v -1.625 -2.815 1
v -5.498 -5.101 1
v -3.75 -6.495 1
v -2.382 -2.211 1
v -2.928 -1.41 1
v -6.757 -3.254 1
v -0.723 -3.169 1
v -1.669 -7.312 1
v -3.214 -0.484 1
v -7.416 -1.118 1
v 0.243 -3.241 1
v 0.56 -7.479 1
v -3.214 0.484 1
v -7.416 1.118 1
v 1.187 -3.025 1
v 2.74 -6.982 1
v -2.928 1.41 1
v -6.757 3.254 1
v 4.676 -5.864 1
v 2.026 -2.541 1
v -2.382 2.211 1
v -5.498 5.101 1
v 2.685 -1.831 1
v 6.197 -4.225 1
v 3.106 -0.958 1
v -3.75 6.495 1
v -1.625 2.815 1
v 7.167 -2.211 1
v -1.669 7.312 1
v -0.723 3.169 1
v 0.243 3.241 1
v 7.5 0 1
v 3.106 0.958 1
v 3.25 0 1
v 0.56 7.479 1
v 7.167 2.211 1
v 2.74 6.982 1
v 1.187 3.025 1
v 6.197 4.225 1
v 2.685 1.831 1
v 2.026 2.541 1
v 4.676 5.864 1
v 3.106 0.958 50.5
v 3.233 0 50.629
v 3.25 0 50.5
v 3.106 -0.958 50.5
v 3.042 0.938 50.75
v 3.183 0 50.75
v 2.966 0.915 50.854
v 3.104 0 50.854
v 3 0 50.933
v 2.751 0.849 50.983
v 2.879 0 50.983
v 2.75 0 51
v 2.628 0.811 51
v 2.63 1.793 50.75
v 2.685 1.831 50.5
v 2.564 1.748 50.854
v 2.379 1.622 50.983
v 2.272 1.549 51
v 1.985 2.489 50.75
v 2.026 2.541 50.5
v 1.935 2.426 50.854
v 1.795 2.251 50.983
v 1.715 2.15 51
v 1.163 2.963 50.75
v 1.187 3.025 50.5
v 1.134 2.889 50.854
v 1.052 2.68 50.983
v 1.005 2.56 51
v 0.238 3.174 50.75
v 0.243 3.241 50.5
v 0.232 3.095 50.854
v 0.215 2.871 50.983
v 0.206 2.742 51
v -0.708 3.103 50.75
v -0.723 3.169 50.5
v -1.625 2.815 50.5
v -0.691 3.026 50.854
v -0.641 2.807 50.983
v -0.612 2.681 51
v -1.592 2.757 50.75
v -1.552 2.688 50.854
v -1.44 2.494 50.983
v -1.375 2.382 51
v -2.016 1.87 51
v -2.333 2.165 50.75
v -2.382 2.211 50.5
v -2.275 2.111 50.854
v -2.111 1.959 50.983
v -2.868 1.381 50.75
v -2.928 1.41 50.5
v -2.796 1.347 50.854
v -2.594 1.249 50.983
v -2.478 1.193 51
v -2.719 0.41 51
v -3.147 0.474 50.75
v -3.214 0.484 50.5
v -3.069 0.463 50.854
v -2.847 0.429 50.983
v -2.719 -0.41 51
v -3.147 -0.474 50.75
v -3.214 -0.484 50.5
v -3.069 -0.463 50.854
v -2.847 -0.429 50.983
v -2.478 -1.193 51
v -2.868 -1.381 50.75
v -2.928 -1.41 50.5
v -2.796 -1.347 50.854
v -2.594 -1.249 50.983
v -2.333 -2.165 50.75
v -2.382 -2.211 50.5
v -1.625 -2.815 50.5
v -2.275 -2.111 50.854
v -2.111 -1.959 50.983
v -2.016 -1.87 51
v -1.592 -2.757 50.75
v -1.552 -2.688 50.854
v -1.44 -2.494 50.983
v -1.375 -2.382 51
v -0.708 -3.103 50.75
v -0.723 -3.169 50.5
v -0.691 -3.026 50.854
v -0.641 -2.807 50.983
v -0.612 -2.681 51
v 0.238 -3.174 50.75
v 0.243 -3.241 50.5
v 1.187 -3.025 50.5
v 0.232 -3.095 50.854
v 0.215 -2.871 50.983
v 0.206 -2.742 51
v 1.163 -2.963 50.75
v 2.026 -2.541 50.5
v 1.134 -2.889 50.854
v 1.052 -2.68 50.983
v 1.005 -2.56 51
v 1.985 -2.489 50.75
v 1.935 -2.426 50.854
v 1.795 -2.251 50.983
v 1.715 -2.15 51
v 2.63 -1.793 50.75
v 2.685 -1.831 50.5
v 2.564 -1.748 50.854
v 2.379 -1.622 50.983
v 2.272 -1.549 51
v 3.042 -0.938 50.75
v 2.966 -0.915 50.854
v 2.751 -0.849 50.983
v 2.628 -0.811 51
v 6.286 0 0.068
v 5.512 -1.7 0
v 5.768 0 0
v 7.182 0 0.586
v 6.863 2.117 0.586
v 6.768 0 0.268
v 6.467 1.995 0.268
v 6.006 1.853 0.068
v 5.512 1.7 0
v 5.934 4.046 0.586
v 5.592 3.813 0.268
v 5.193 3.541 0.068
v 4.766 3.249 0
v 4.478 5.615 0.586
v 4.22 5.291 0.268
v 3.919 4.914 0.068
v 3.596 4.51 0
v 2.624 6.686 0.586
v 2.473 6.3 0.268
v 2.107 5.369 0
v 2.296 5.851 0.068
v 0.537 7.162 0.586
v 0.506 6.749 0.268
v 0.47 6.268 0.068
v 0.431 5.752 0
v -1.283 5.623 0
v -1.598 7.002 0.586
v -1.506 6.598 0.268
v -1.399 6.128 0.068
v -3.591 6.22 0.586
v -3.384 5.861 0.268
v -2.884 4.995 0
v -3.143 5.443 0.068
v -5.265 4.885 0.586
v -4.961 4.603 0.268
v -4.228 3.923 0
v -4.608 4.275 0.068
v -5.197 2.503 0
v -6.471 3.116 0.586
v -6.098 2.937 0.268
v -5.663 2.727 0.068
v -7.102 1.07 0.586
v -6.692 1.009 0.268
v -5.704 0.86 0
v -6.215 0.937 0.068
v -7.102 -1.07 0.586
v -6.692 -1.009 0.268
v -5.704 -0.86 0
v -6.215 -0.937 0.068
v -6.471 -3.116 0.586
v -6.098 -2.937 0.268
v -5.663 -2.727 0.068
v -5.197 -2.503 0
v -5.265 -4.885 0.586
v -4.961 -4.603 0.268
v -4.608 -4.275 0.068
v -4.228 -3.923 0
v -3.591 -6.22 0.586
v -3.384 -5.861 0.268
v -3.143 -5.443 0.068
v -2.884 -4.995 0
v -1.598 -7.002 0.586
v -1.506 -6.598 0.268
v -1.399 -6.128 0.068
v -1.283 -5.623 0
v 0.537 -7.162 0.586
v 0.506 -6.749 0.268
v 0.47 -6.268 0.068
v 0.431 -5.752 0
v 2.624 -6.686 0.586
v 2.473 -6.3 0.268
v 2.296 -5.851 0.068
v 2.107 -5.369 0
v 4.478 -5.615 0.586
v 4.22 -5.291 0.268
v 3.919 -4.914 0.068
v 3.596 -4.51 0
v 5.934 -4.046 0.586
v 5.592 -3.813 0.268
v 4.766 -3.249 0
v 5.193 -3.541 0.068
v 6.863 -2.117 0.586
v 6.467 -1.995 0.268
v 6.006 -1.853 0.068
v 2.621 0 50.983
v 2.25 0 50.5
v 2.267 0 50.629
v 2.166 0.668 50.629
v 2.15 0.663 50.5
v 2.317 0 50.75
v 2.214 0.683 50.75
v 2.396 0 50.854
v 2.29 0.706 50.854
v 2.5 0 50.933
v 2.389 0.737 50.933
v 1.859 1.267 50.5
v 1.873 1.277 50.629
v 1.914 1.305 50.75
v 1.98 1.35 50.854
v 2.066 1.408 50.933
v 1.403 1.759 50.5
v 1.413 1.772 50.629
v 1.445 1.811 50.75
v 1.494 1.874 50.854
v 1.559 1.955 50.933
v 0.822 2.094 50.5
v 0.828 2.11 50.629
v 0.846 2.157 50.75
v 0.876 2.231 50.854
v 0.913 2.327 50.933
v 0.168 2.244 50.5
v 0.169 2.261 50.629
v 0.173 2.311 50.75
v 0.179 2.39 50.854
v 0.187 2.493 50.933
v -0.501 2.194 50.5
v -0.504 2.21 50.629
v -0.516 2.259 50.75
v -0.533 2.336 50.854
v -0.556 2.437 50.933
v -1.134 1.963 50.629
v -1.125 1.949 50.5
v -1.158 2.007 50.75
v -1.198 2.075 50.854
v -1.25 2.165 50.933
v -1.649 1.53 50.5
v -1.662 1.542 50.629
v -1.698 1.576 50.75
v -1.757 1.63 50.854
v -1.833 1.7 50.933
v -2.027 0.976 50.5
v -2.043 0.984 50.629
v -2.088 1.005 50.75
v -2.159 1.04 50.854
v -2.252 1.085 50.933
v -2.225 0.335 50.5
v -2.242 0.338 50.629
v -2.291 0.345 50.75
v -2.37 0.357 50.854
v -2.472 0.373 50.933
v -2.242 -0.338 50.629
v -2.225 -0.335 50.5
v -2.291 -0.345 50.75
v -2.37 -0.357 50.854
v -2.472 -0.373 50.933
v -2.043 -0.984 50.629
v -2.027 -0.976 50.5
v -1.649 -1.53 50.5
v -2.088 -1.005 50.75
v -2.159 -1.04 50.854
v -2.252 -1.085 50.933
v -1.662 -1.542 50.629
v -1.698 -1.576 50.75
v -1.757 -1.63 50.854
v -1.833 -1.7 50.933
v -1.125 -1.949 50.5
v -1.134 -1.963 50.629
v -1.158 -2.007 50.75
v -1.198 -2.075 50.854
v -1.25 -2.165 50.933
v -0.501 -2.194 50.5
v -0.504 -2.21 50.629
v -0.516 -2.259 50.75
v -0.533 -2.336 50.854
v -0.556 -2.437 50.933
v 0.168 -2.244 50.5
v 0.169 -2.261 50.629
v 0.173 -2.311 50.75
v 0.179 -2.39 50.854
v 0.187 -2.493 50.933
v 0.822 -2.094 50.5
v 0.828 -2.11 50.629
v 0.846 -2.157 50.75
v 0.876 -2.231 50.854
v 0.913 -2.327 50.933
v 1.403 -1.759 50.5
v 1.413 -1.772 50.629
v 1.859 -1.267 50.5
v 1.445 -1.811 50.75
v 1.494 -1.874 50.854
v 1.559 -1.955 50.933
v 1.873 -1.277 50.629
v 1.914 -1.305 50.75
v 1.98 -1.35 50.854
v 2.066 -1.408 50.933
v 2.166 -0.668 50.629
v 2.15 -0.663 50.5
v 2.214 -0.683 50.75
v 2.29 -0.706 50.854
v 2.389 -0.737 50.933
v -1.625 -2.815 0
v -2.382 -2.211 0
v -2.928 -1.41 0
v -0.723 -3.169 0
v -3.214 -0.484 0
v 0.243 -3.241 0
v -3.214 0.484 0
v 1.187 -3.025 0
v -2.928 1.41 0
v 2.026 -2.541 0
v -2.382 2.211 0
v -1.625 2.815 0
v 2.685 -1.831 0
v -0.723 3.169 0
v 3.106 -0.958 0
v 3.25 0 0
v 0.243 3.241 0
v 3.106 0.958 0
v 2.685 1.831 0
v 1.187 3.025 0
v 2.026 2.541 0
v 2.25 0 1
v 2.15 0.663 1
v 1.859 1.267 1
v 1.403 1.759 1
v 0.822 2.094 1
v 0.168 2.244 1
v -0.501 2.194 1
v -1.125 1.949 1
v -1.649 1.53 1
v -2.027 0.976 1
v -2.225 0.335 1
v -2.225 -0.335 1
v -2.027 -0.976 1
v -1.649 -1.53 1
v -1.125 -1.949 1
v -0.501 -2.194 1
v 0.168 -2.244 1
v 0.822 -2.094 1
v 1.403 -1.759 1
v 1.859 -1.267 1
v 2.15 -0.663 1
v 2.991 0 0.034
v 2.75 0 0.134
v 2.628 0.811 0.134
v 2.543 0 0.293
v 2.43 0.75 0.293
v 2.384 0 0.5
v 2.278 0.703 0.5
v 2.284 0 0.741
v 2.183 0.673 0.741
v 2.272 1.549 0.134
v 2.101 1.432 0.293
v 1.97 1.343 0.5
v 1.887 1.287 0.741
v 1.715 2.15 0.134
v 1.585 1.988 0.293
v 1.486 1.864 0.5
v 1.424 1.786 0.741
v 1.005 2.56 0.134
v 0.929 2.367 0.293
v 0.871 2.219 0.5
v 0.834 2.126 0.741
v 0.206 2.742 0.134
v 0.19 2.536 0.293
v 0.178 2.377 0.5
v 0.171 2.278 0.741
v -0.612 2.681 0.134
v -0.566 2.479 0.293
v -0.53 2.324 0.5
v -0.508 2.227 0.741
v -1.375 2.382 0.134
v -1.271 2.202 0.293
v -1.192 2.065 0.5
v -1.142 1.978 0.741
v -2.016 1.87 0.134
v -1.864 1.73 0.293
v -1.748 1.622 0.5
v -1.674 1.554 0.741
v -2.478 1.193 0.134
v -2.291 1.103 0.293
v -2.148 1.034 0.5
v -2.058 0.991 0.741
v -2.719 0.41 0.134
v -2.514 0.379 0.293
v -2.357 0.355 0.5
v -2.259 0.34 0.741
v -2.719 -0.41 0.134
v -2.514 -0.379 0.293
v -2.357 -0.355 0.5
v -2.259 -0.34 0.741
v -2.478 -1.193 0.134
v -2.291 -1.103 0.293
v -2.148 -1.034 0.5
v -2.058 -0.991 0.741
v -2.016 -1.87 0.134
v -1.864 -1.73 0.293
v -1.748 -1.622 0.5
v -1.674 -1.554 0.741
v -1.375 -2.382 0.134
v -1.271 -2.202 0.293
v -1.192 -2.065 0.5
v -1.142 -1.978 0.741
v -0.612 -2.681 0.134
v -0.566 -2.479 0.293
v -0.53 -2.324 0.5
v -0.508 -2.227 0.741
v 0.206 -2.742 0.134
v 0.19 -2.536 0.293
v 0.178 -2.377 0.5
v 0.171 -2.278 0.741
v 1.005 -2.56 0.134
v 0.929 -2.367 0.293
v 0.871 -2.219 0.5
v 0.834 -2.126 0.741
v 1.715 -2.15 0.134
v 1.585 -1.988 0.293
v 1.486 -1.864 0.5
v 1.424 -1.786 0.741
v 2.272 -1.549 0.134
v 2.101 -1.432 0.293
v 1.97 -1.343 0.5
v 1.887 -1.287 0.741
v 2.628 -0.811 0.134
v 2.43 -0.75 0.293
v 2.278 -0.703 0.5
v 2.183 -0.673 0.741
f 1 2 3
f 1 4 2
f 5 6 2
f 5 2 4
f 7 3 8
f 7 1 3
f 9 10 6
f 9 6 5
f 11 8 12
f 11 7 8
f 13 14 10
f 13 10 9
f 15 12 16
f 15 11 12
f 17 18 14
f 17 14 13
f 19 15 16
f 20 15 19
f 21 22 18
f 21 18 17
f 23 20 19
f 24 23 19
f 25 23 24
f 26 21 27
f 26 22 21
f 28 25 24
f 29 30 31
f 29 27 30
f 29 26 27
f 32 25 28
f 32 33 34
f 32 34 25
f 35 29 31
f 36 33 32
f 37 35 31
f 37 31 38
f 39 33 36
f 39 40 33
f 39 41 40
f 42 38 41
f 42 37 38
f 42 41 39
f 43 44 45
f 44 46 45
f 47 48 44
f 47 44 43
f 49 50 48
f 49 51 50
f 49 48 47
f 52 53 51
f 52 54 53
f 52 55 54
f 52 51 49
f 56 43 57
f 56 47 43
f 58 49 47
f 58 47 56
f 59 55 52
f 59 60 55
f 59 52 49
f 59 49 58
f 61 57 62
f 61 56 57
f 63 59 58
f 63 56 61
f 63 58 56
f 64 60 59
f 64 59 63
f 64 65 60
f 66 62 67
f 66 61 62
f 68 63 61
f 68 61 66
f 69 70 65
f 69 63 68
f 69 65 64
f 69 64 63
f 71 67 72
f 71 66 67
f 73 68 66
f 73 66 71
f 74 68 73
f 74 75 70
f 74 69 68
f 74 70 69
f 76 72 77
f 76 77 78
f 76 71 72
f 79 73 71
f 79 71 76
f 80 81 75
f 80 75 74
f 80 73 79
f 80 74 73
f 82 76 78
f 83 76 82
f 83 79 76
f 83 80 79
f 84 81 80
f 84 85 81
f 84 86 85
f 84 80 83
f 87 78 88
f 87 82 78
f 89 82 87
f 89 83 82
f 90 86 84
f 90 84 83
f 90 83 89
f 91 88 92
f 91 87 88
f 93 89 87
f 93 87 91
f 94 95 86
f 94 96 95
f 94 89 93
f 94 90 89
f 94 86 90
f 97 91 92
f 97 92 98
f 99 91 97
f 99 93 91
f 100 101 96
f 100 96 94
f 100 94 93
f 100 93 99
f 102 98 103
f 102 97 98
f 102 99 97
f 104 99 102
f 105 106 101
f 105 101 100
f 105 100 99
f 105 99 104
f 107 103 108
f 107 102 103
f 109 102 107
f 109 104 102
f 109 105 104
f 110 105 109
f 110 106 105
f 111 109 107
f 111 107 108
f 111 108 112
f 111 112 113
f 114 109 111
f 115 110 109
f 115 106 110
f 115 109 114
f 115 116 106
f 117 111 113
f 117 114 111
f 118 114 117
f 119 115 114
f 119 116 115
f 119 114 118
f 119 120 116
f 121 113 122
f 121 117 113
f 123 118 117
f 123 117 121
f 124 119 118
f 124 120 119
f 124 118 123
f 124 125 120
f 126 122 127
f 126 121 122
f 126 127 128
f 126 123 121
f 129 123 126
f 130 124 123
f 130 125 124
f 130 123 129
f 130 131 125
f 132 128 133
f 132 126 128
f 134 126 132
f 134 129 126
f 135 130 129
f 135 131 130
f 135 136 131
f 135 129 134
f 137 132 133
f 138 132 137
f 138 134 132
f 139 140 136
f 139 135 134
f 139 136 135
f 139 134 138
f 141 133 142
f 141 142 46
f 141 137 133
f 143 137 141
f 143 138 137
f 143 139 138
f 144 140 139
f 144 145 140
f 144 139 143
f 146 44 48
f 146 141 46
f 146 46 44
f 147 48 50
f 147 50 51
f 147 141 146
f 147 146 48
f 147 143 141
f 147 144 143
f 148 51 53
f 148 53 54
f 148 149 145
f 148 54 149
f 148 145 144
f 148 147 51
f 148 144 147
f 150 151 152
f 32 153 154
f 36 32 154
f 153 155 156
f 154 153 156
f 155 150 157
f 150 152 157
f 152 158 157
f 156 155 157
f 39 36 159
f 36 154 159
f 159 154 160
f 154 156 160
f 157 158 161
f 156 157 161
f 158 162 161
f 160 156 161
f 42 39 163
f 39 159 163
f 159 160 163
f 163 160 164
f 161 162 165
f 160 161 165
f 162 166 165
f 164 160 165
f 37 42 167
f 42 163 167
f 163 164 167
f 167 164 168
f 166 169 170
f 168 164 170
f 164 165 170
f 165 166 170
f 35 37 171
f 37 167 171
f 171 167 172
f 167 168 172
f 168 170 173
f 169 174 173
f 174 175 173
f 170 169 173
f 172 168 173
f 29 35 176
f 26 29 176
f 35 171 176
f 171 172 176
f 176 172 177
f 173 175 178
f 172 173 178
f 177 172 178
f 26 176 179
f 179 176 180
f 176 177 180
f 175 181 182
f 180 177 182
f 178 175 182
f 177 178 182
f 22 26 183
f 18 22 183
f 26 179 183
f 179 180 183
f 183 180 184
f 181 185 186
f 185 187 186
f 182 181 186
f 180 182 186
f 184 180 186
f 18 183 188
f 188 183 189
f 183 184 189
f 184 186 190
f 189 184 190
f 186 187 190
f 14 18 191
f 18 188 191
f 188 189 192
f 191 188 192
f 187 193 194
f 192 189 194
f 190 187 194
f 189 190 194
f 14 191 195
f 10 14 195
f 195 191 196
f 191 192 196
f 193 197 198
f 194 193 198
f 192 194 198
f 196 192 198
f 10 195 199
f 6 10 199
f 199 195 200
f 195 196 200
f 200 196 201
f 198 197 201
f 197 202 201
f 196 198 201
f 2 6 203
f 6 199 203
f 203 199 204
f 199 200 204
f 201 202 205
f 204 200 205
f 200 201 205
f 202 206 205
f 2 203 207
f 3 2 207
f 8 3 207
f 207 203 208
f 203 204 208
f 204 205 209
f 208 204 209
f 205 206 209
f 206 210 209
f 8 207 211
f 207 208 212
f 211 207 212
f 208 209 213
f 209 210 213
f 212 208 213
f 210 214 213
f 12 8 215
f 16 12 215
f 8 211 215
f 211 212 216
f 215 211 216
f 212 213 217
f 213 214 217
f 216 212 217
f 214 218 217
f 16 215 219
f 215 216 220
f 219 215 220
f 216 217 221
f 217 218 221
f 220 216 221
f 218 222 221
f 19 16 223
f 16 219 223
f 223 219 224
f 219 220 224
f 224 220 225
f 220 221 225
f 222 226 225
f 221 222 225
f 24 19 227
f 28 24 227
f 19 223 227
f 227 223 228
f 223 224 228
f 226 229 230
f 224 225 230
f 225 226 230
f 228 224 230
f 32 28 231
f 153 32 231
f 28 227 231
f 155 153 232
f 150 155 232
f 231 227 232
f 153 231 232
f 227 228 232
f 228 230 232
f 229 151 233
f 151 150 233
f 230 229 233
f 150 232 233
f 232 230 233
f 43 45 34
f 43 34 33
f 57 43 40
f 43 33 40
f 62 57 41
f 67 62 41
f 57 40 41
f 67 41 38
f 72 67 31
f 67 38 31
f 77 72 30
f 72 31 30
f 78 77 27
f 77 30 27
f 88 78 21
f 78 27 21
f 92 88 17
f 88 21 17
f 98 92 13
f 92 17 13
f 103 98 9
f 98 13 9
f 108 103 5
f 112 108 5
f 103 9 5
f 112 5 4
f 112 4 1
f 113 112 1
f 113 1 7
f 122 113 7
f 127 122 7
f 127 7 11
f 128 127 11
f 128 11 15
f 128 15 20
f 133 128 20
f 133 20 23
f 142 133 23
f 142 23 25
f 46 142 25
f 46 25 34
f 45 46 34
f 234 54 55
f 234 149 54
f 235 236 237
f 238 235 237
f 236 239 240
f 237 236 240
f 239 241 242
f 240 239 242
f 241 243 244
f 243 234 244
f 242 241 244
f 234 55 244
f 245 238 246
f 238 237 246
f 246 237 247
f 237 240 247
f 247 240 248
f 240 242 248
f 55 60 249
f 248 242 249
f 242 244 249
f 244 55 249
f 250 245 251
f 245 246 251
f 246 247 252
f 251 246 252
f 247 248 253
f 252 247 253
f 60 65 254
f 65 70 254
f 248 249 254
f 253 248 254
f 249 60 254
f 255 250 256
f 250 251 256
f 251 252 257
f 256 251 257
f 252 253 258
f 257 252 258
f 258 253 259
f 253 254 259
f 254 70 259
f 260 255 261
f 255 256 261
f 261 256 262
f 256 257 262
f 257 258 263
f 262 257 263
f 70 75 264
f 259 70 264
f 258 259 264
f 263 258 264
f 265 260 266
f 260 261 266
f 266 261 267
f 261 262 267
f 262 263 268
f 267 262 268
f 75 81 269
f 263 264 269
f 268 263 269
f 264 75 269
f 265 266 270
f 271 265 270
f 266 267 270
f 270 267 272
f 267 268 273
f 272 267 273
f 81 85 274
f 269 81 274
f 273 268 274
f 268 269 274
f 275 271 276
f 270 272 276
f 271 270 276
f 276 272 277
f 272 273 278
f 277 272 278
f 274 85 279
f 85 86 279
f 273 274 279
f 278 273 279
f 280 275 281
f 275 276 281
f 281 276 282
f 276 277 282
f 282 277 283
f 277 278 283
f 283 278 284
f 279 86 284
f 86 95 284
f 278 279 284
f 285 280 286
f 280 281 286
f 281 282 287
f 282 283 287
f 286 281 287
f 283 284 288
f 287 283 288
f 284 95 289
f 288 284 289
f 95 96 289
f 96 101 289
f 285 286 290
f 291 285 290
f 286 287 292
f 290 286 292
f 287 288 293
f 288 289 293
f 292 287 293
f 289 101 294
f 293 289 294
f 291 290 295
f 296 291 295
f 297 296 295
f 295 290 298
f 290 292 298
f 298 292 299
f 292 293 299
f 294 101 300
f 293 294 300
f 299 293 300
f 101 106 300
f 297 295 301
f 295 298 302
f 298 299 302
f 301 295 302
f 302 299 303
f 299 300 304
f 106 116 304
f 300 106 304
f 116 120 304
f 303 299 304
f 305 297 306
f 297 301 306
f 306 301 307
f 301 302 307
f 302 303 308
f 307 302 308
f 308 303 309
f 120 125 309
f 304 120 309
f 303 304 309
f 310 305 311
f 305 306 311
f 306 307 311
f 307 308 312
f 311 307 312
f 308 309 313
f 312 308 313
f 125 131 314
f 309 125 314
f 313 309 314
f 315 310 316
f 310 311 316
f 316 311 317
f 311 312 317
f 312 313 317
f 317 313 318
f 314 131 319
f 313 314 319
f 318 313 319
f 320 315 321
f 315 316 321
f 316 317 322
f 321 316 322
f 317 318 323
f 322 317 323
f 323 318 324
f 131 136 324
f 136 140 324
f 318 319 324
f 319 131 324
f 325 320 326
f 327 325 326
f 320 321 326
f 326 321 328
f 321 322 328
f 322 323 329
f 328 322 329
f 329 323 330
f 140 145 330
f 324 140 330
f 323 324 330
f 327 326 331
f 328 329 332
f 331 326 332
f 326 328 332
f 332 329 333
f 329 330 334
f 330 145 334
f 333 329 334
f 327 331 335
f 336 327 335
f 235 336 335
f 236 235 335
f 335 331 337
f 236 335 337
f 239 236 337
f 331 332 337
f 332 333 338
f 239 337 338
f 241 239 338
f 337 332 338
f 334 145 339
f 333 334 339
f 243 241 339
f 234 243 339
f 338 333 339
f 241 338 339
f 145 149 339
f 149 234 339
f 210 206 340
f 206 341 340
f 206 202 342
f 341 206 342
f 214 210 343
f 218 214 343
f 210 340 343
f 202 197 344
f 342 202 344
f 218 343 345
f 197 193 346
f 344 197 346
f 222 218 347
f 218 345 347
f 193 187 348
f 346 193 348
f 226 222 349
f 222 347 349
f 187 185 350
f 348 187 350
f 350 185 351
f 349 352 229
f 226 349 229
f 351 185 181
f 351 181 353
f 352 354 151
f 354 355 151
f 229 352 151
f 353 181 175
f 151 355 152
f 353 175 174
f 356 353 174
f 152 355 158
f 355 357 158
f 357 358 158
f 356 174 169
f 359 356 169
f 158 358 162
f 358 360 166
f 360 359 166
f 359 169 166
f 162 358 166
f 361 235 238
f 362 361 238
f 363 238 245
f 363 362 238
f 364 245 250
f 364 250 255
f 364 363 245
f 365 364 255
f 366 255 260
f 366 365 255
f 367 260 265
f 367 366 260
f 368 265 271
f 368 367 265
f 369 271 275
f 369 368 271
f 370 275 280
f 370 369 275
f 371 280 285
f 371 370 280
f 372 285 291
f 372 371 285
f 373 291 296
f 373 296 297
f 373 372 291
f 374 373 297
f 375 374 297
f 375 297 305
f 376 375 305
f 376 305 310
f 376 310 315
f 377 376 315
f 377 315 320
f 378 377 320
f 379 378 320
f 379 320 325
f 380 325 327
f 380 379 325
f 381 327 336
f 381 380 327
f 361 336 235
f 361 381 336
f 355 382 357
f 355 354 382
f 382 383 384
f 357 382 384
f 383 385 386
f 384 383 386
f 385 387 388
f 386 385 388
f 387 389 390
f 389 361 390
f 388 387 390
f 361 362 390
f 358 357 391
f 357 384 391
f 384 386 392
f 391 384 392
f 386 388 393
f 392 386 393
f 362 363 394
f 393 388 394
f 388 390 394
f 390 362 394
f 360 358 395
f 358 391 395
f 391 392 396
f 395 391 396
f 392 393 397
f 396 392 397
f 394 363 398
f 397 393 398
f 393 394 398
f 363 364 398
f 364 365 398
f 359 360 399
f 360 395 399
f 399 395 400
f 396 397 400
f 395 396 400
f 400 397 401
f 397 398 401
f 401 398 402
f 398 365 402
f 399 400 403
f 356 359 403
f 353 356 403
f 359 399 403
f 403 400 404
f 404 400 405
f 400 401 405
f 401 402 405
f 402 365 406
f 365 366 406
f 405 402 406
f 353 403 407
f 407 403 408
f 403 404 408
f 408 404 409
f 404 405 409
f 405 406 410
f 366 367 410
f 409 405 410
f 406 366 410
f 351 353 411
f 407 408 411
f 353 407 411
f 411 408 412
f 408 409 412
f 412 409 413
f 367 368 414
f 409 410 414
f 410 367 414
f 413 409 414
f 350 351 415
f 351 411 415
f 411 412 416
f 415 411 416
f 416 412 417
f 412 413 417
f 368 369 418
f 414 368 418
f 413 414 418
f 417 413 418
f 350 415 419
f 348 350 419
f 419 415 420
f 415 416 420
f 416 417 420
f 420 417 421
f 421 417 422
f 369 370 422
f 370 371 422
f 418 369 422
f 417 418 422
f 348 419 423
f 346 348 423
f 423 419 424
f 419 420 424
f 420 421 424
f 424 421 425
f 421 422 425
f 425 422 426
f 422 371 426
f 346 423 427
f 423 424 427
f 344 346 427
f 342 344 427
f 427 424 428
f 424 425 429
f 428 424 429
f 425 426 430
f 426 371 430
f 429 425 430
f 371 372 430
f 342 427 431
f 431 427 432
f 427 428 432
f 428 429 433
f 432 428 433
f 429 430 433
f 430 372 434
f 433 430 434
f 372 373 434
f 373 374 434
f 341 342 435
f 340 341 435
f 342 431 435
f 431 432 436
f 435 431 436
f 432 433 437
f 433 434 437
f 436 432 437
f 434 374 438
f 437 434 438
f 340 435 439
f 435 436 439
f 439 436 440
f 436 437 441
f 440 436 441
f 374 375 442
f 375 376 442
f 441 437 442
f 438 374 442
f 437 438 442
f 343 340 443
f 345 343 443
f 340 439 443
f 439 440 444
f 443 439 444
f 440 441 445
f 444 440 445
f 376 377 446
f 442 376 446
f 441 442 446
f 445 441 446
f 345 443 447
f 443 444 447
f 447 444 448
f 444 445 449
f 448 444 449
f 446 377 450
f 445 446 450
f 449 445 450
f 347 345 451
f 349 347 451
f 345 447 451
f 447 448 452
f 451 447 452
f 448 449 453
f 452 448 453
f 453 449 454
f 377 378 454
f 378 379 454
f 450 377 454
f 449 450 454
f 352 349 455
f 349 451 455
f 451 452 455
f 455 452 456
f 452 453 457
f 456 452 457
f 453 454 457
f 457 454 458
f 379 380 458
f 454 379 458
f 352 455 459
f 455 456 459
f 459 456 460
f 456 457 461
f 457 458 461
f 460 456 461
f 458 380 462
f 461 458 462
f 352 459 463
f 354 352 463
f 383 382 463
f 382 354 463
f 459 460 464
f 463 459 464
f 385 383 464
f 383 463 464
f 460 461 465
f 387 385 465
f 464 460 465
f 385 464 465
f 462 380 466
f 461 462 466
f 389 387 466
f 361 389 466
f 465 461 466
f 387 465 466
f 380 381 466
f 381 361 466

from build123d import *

# Parameters (mm, degrees)
F0_R     = 3.25
F0_R_2   = 2.25
F1_DEPTH = 51
F0_R_3   = 7.5
F2_DEPTH = 1
F3_R     = 0.49999
F5_R     = 1


# Not quite as in the source:
# - a fillet or chamfer that OpenCascade refuses, or shapes differently, is made with other operations: its cross-section is extruded or revolved along the edge and cut away or added
# - a fillet or chamfer is up to 0.001 mm smaller than in the source, because OpenCascade refuses the exact size


with BuildPart() as f1:
    # F0 (on Top) → F1 (new body)
    with BuildSketch(Plane.XY):
        Circle(F0_R)
        Circle(F0_R_2, mode=Mode.SUBTRACT)
    extrude(amount=F1_DEPTH)

    # F0 (on Top) → F2 (join)
    with BuildSketch(Plane.XY):
        Circle(F0_R_3)
        Circle(F0_R, mode=Mode.SUBTRACT)
    extrude(amount=F2_DEPTH)

    # F3 (radius 0.5 in the source; OpenCascade refuses exactly that, so slightly less here)
    f3_edges = [f1.edges().sort_by_distance(p)[0] for p in [
        (-3.25, 0, 51),
        (-2.25, 0, 51),
    ]]
    fillet(f3_edges, radius=F3_R)

    # F4: fillet of radius 2 on 1 edges, made by hand

    # F4_s1 → F4_t2 (revolve, cut)
    with BuildSketch(Plane.XZ):
        with BuildLine():
            ThreePointArc((7.5, 1), (6.7679491924, 0.2679491924), (5.7679491924, 0))
            Line((5.7679491924, 0), (7.5, 0))
            Line((7.5, 0), (7.5, 1))
        make_face()
    revolve(axis=Axis((0, 0, 0), (0, 0, 1)), mode=Mode.SUBTRACT)

    # F5
    f5_edges = [f1.edges().sort_by_distance(p)[0] for p in [
        (-2.25, 0, 0),
    ]]
    fillet(f5_edges, radius=F5_R)


solid = f1.part
